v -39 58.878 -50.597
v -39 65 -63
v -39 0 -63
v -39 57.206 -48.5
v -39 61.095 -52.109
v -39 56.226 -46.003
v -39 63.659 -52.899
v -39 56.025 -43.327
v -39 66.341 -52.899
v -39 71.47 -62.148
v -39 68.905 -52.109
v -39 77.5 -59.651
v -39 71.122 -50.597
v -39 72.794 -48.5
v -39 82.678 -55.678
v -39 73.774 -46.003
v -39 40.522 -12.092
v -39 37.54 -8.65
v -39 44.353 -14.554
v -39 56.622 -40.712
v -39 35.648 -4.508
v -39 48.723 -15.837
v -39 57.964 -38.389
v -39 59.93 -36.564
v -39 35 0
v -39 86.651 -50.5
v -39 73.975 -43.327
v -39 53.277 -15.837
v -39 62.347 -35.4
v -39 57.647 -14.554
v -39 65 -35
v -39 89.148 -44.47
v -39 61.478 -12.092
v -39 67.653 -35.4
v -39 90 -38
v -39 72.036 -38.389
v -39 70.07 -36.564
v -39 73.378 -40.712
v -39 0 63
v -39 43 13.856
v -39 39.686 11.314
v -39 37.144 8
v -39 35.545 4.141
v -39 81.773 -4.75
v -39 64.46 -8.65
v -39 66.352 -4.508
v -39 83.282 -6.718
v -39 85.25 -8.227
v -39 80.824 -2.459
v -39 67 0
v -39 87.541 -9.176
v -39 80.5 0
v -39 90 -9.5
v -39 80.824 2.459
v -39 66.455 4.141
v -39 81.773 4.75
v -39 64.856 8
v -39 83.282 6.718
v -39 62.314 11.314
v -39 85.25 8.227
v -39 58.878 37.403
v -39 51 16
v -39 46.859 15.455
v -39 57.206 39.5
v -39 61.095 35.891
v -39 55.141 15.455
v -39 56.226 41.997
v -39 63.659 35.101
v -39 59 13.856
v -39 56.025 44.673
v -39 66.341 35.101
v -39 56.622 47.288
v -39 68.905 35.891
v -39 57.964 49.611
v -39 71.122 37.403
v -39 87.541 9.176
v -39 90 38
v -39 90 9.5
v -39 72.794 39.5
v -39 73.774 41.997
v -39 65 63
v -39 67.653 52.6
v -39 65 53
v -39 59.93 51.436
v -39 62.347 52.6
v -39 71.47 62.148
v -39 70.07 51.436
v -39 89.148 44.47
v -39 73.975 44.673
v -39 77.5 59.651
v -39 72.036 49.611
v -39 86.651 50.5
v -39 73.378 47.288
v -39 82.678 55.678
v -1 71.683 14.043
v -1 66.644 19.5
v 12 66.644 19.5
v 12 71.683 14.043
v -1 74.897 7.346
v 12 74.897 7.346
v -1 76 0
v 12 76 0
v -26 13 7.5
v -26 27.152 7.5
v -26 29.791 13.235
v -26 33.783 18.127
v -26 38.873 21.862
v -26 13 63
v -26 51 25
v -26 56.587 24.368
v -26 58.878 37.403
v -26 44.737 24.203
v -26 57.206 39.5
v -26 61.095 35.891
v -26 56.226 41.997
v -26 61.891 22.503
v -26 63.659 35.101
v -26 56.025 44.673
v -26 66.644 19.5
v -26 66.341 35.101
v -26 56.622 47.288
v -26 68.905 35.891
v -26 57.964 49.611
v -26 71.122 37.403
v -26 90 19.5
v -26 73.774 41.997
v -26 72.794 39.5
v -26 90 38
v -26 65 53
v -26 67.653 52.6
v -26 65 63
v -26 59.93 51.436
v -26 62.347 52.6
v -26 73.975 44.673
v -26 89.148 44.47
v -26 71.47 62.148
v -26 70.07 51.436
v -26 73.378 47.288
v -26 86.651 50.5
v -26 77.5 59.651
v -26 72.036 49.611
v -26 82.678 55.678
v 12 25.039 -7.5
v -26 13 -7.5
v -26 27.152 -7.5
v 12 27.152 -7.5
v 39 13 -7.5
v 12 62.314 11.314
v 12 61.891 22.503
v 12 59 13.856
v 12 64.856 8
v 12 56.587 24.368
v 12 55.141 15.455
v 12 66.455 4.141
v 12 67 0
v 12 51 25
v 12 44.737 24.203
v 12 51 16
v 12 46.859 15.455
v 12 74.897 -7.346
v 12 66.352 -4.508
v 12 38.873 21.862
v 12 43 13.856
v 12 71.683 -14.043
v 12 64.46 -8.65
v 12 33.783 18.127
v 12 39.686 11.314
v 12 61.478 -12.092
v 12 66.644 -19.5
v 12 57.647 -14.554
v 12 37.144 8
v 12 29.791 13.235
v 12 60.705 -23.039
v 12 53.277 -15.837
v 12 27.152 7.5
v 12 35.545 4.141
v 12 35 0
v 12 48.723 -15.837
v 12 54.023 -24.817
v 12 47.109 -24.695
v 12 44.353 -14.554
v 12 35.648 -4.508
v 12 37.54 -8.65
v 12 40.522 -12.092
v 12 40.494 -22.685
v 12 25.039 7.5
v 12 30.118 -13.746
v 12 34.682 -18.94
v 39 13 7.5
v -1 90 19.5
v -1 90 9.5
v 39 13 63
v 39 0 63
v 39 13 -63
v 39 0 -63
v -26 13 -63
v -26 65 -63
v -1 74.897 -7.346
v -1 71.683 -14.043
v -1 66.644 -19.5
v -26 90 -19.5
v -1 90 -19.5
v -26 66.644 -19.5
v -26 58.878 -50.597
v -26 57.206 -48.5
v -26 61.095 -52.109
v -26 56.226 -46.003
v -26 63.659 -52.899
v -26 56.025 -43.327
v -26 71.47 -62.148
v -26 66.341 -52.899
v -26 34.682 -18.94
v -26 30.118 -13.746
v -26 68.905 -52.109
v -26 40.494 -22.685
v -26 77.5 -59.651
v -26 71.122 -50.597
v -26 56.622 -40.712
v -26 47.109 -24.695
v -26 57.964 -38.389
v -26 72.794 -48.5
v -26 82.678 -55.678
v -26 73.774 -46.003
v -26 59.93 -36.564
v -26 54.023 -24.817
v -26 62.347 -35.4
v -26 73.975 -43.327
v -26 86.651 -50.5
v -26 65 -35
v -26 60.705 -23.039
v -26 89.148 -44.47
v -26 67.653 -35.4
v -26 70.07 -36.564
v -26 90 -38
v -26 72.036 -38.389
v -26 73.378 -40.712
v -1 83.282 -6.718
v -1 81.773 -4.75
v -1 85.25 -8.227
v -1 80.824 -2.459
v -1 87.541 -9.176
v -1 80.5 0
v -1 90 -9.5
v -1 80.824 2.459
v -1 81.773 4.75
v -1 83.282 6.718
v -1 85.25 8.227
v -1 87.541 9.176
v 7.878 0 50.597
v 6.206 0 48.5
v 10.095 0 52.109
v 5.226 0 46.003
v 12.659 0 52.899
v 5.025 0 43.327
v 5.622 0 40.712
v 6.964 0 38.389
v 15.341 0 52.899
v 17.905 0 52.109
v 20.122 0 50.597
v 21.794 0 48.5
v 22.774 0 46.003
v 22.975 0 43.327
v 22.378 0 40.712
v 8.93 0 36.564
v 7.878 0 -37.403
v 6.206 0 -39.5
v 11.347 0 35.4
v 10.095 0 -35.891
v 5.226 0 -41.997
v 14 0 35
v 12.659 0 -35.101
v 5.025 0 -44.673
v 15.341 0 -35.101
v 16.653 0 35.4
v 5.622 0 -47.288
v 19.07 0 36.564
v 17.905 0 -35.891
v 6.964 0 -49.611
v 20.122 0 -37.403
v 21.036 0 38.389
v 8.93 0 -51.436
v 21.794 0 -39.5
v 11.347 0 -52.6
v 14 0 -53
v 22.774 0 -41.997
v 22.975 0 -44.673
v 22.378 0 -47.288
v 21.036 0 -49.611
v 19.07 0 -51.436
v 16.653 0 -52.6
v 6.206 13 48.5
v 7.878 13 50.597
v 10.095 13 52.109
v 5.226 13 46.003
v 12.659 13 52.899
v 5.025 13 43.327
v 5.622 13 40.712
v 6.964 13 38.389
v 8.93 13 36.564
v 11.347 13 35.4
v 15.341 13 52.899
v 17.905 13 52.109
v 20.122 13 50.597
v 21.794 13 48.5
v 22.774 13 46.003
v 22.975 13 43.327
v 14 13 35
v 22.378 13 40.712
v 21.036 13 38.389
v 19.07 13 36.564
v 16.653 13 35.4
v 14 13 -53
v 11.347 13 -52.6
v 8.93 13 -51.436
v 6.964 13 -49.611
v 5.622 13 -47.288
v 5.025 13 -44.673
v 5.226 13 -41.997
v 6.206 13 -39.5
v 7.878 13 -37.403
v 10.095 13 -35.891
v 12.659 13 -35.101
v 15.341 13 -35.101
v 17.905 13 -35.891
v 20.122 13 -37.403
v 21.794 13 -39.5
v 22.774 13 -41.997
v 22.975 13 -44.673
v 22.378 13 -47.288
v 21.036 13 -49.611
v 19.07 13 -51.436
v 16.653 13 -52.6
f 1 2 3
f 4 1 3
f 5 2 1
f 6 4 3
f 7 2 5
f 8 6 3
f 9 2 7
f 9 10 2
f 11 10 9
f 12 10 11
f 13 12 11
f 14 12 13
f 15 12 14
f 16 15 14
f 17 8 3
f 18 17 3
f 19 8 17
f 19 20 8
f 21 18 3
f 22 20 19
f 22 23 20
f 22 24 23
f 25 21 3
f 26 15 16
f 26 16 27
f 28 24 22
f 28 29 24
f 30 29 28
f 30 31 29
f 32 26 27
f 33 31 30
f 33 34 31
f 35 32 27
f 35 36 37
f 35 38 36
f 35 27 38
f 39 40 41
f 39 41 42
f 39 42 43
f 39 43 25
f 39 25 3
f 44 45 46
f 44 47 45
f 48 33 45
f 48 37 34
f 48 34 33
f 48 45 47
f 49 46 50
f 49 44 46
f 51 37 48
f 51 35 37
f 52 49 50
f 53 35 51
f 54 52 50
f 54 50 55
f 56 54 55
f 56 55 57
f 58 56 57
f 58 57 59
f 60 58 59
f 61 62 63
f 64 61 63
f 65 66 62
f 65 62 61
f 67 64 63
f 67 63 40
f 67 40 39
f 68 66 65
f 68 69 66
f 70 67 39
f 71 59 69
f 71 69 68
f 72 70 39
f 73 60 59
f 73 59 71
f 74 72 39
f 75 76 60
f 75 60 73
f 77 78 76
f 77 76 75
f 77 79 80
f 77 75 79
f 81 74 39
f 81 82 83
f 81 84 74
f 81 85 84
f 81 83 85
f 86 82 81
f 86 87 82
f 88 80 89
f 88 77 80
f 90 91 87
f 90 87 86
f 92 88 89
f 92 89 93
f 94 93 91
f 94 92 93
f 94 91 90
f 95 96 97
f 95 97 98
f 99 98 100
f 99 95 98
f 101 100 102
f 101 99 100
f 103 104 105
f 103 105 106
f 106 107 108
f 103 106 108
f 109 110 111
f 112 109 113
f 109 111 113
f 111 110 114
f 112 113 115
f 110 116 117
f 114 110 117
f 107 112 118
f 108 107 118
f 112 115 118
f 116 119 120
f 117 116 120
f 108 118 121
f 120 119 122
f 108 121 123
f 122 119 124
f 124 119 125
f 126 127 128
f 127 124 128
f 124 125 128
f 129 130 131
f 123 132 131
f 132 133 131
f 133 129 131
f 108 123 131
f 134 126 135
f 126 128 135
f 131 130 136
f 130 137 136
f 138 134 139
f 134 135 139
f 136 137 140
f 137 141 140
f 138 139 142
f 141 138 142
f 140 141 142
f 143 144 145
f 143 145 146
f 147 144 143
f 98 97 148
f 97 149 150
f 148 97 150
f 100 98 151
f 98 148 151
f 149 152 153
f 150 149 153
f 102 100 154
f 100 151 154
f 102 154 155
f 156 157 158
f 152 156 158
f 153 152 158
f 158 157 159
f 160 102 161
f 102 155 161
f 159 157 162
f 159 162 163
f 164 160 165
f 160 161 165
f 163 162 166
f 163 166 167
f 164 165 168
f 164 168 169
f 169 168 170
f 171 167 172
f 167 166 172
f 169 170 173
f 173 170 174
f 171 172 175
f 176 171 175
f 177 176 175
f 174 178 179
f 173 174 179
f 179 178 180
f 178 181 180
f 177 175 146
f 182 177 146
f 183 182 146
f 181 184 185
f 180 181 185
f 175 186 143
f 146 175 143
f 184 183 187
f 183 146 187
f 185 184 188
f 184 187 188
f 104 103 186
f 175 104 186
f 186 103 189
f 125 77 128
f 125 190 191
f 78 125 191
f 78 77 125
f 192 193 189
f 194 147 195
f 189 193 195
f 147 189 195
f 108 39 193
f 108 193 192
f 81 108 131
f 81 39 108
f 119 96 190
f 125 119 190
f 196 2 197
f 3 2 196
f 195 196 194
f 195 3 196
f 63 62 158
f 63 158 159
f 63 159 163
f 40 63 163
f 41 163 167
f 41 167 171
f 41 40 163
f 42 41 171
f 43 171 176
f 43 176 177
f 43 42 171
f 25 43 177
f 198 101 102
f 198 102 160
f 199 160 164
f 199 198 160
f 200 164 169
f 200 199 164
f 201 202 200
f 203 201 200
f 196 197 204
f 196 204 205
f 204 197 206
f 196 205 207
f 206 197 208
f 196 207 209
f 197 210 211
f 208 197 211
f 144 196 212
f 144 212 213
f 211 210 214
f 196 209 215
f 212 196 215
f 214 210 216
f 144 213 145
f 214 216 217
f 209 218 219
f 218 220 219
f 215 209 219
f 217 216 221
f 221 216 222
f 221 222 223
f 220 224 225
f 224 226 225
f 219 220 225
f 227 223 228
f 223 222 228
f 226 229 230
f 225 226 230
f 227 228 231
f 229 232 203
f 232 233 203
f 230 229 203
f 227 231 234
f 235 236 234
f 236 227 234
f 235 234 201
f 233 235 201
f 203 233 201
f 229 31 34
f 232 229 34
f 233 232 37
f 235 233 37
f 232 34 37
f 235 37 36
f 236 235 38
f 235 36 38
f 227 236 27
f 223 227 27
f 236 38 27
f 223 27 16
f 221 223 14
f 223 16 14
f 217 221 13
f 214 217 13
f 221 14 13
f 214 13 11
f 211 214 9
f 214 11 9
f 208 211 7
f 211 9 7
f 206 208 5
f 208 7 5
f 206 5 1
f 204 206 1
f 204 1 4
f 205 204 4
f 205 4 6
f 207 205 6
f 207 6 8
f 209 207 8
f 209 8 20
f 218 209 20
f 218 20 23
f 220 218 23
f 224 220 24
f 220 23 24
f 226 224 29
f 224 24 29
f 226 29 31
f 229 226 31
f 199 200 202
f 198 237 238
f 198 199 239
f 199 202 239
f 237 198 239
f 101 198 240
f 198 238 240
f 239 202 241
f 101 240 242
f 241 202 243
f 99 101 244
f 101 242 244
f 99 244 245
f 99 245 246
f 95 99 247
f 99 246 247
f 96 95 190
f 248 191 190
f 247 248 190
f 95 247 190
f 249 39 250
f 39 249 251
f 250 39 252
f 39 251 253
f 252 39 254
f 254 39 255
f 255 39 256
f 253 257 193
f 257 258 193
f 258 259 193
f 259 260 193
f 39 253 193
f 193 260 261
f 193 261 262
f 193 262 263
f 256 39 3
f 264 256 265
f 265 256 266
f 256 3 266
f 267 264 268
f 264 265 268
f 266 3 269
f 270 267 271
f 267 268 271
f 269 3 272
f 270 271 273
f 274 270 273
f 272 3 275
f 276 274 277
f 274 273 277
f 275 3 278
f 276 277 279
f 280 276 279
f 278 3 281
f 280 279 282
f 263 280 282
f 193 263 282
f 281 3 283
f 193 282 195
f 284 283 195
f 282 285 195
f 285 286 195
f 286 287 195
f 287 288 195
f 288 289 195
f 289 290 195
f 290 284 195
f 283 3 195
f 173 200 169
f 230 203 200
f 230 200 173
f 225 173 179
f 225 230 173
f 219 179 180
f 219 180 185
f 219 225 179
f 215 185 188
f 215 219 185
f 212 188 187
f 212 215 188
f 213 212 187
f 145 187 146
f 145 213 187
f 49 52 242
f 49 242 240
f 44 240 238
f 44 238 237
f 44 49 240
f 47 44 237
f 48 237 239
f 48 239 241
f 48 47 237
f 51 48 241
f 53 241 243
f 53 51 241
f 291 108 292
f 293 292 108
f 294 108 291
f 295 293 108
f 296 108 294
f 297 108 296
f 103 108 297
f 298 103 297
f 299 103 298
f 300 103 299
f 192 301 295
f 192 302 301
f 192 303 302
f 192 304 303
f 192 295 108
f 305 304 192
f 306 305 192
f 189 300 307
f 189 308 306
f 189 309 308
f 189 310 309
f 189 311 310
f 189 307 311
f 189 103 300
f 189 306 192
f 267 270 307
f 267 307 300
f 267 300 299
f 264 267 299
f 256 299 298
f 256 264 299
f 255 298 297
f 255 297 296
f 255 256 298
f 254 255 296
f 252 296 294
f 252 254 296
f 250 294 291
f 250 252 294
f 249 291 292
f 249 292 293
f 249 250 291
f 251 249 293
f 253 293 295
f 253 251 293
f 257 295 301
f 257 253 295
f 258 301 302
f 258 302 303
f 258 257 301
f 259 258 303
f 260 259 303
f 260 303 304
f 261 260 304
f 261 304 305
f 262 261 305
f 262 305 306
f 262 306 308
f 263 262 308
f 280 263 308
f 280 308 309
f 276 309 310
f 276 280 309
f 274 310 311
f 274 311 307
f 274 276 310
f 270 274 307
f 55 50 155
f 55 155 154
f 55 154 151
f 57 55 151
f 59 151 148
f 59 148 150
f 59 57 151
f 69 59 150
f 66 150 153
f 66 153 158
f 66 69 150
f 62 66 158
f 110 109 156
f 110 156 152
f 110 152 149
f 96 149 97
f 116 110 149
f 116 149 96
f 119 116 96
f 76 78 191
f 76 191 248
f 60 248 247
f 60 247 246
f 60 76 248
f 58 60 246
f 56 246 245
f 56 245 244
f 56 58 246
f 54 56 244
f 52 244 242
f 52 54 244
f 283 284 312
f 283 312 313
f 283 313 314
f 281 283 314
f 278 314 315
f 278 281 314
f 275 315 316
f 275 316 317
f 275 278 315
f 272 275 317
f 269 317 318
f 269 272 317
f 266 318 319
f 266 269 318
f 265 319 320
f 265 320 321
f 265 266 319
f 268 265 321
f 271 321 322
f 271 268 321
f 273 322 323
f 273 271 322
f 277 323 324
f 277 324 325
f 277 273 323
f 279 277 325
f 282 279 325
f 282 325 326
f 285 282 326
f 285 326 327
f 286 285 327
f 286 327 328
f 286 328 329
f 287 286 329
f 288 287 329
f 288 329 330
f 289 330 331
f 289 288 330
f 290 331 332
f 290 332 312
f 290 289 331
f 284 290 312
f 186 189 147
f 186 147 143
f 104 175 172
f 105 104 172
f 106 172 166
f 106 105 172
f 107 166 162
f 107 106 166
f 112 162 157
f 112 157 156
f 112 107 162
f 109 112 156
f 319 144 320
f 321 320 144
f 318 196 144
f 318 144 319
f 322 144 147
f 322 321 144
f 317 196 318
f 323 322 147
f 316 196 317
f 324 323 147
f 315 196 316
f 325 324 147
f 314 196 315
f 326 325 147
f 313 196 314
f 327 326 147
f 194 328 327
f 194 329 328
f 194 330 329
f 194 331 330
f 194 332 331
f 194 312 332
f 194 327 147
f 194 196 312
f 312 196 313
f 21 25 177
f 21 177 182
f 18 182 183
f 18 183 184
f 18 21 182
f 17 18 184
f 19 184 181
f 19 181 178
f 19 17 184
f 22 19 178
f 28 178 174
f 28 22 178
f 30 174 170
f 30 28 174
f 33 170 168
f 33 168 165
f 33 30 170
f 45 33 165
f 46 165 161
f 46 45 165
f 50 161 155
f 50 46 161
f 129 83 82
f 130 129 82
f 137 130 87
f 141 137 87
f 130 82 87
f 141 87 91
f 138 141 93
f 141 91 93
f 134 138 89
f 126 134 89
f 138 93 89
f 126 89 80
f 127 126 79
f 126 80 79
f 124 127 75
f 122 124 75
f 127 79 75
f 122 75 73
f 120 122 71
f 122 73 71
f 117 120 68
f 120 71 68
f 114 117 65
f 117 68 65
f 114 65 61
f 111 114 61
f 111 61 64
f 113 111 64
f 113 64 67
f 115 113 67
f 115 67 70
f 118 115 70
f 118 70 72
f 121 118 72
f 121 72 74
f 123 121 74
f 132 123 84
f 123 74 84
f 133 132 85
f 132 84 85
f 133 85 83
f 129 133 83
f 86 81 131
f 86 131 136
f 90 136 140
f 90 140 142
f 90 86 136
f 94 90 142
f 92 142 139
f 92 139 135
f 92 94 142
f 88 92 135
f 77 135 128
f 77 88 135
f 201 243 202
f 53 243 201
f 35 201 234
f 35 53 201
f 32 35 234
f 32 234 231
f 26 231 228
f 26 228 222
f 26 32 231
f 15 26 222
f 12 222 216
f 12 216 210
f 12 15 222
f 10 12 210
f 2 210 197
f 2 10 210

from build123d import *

# Parameters (mm, degrees)
SKETCH1_W                = 78
SKETCH1_H                = 126
SKETCH1_R                = 9
BOSS_EXTRUDE1_DEPTH      = 13
SKETCH2_R                = 9
BOSS_EXTRUDE2_DEPTH      = 13
BOSS_EXTRUDE3_DEPTH      = 38
SKETCH2_4_R              = 25
SKETCH2_4_R_2            = 16
BOSS_EXTRUDE4_DEPTH      = 51
BOSS_EXTRUDE5_DEPTH      = 7.5
BOSS_EXTRUDE6_REACH      = 100.539
BOSS_EXTRUDE6_END_RADIUS = 25
SKETCH4_W                = 38
SKETCH4_H                = 15


with BuildPart() as part:
    # Sketch1 → Boss-Extrude1 (new body)
    with BuildSketch(Plane(origin=(0, 0, 0), x_dir=(1, 0, 0), z_dir=(0, 1, 0))):
        Rectangle(SKETCH1_W, SKETCH1_H)
        with Locations((14, -44)):
            Circle(SKETCH1_R, mode=Mode.SUBTRACT)
        with Locations((14, 44)):
            Circle(SKETCH1_R, mode=Mode.SUBTRACT)
    extrude(amount=BOSS_EXTRUDE1_DEPTH)

    # Sketch2 → Boss-Extrude2 (add)
    with BuildSketch(Plane.ZY.offset(39)):
        with BuildLine():
            Line((63, 13), (63, 65))
            ThreePointArc((63, 65), (55.67766953, 82.67766953), (38, 90))
            Line((38, 90), (19.5, 90))
            Line((19.5, 90), (19.5, 66.644487847))
            ThreePointArc((19.5, 66.644487847), (0, 26), (-19.5, 66.644487847))
            Line((-19.5, 66.644487847), (-19.5, 90))
            Line((-19.5, 90), (-38, 90))
            ThreePointArc((-38, 90), (-55.67766953, 82.67766953), (-63, 65))
            Line((-63, 65), (-63, 13))
            Line((-63, 13), (63, 13))
        make_face()
        with Locations((44, 65)):
            Circle(SKETCH2_R, mode=Mode.SUBTRACT)
        with Locations((-44, 65)):
            Circle(SKETCH2_R, mode=Mode.SUBTRACT)
    extrude(amount=-BOSS_EXTRUDE2_DEPTH)

    # Sketch2<3> → Boss-Extrude3 (add)
    with BuildSketch(Plane.ZY.offset(39)):
        with BuildLine():
            Line((19.5, 66.644487847), (19.5, 90))
            Line((19.5, 90), (9.5, 90))
            ThreePointArc((9.5, 90), (0, 80.5), (-9.5, 90))
            Line((-9.5, 90), (-19.5, 90))
            Line((-19.5, 90), (-19.5, 66.644487847))
            ThreePointArc((-19.5, 66.644487847), (0, 76), (19.5, 66.644487847))
        make_face()
    extrude(amount=-BOSS_EXTRUDE3_DEPTH)

    # Sketch2<4> → Boss-Extrude4 (add)
    with BuildSketch(Plane.ZY.offset(39)):
        with Locations((0, 51)):
            Circle(SKETCH2_4_R)
        with Locations((0, 51)):
            Circle(SKETCH2_4_R_2, mode=Mode.SUBTRACT)
    extrude(amount=-BOSS_EXTRUDE4_DEPTH)

    # Sketch3 → Boss-Extrude5 (add, symmetric)
    with BuildSketch(Plane.XY):
        Polygon((-26, 13), (39, 13), (12, 25.03887683), (-26, 25.03887683), align=None)
    extrude(amount=BOSS_EXTRUDE5_DEPTH, both=True)

    # Boss-Extrude6: up to this cylinder (the profile starts outside it)
    boss_extrude6_end = Plane(origin=(-7, 51, 0), z_dir=(-1, 0, 0)) * Cylinder(BOSS_EXTRUDE6_END_RADIUS, 252.078, mode=Mode.PRIVATE)
    # Sketch4 → Boss-Extrude6 (add, up to the surface)
    with BuildSketch(Plane(origin=(0, 25.03887683, 0), x_dir=(1, 0, 0), z_dir=(0, 1, 0)), mode=Mode.PRIVATE) as boss_extrude6_sk1:
        with Locations((-7, 0)):
            Rectangle(SKETCH4_W, SKETCH4_H)
    boss_extrude6_tool1 = extrude(boss_extrude6_sk1.sketch, amount=BOSS_EXTRUDE6_REACH, mode=Mode.PRIVATE) - boss_extrude6_end
    add(boss_extrude6_tool1.solids().sort_by_distance((-7, 25.038877, 0))[0])


solid = part.part
